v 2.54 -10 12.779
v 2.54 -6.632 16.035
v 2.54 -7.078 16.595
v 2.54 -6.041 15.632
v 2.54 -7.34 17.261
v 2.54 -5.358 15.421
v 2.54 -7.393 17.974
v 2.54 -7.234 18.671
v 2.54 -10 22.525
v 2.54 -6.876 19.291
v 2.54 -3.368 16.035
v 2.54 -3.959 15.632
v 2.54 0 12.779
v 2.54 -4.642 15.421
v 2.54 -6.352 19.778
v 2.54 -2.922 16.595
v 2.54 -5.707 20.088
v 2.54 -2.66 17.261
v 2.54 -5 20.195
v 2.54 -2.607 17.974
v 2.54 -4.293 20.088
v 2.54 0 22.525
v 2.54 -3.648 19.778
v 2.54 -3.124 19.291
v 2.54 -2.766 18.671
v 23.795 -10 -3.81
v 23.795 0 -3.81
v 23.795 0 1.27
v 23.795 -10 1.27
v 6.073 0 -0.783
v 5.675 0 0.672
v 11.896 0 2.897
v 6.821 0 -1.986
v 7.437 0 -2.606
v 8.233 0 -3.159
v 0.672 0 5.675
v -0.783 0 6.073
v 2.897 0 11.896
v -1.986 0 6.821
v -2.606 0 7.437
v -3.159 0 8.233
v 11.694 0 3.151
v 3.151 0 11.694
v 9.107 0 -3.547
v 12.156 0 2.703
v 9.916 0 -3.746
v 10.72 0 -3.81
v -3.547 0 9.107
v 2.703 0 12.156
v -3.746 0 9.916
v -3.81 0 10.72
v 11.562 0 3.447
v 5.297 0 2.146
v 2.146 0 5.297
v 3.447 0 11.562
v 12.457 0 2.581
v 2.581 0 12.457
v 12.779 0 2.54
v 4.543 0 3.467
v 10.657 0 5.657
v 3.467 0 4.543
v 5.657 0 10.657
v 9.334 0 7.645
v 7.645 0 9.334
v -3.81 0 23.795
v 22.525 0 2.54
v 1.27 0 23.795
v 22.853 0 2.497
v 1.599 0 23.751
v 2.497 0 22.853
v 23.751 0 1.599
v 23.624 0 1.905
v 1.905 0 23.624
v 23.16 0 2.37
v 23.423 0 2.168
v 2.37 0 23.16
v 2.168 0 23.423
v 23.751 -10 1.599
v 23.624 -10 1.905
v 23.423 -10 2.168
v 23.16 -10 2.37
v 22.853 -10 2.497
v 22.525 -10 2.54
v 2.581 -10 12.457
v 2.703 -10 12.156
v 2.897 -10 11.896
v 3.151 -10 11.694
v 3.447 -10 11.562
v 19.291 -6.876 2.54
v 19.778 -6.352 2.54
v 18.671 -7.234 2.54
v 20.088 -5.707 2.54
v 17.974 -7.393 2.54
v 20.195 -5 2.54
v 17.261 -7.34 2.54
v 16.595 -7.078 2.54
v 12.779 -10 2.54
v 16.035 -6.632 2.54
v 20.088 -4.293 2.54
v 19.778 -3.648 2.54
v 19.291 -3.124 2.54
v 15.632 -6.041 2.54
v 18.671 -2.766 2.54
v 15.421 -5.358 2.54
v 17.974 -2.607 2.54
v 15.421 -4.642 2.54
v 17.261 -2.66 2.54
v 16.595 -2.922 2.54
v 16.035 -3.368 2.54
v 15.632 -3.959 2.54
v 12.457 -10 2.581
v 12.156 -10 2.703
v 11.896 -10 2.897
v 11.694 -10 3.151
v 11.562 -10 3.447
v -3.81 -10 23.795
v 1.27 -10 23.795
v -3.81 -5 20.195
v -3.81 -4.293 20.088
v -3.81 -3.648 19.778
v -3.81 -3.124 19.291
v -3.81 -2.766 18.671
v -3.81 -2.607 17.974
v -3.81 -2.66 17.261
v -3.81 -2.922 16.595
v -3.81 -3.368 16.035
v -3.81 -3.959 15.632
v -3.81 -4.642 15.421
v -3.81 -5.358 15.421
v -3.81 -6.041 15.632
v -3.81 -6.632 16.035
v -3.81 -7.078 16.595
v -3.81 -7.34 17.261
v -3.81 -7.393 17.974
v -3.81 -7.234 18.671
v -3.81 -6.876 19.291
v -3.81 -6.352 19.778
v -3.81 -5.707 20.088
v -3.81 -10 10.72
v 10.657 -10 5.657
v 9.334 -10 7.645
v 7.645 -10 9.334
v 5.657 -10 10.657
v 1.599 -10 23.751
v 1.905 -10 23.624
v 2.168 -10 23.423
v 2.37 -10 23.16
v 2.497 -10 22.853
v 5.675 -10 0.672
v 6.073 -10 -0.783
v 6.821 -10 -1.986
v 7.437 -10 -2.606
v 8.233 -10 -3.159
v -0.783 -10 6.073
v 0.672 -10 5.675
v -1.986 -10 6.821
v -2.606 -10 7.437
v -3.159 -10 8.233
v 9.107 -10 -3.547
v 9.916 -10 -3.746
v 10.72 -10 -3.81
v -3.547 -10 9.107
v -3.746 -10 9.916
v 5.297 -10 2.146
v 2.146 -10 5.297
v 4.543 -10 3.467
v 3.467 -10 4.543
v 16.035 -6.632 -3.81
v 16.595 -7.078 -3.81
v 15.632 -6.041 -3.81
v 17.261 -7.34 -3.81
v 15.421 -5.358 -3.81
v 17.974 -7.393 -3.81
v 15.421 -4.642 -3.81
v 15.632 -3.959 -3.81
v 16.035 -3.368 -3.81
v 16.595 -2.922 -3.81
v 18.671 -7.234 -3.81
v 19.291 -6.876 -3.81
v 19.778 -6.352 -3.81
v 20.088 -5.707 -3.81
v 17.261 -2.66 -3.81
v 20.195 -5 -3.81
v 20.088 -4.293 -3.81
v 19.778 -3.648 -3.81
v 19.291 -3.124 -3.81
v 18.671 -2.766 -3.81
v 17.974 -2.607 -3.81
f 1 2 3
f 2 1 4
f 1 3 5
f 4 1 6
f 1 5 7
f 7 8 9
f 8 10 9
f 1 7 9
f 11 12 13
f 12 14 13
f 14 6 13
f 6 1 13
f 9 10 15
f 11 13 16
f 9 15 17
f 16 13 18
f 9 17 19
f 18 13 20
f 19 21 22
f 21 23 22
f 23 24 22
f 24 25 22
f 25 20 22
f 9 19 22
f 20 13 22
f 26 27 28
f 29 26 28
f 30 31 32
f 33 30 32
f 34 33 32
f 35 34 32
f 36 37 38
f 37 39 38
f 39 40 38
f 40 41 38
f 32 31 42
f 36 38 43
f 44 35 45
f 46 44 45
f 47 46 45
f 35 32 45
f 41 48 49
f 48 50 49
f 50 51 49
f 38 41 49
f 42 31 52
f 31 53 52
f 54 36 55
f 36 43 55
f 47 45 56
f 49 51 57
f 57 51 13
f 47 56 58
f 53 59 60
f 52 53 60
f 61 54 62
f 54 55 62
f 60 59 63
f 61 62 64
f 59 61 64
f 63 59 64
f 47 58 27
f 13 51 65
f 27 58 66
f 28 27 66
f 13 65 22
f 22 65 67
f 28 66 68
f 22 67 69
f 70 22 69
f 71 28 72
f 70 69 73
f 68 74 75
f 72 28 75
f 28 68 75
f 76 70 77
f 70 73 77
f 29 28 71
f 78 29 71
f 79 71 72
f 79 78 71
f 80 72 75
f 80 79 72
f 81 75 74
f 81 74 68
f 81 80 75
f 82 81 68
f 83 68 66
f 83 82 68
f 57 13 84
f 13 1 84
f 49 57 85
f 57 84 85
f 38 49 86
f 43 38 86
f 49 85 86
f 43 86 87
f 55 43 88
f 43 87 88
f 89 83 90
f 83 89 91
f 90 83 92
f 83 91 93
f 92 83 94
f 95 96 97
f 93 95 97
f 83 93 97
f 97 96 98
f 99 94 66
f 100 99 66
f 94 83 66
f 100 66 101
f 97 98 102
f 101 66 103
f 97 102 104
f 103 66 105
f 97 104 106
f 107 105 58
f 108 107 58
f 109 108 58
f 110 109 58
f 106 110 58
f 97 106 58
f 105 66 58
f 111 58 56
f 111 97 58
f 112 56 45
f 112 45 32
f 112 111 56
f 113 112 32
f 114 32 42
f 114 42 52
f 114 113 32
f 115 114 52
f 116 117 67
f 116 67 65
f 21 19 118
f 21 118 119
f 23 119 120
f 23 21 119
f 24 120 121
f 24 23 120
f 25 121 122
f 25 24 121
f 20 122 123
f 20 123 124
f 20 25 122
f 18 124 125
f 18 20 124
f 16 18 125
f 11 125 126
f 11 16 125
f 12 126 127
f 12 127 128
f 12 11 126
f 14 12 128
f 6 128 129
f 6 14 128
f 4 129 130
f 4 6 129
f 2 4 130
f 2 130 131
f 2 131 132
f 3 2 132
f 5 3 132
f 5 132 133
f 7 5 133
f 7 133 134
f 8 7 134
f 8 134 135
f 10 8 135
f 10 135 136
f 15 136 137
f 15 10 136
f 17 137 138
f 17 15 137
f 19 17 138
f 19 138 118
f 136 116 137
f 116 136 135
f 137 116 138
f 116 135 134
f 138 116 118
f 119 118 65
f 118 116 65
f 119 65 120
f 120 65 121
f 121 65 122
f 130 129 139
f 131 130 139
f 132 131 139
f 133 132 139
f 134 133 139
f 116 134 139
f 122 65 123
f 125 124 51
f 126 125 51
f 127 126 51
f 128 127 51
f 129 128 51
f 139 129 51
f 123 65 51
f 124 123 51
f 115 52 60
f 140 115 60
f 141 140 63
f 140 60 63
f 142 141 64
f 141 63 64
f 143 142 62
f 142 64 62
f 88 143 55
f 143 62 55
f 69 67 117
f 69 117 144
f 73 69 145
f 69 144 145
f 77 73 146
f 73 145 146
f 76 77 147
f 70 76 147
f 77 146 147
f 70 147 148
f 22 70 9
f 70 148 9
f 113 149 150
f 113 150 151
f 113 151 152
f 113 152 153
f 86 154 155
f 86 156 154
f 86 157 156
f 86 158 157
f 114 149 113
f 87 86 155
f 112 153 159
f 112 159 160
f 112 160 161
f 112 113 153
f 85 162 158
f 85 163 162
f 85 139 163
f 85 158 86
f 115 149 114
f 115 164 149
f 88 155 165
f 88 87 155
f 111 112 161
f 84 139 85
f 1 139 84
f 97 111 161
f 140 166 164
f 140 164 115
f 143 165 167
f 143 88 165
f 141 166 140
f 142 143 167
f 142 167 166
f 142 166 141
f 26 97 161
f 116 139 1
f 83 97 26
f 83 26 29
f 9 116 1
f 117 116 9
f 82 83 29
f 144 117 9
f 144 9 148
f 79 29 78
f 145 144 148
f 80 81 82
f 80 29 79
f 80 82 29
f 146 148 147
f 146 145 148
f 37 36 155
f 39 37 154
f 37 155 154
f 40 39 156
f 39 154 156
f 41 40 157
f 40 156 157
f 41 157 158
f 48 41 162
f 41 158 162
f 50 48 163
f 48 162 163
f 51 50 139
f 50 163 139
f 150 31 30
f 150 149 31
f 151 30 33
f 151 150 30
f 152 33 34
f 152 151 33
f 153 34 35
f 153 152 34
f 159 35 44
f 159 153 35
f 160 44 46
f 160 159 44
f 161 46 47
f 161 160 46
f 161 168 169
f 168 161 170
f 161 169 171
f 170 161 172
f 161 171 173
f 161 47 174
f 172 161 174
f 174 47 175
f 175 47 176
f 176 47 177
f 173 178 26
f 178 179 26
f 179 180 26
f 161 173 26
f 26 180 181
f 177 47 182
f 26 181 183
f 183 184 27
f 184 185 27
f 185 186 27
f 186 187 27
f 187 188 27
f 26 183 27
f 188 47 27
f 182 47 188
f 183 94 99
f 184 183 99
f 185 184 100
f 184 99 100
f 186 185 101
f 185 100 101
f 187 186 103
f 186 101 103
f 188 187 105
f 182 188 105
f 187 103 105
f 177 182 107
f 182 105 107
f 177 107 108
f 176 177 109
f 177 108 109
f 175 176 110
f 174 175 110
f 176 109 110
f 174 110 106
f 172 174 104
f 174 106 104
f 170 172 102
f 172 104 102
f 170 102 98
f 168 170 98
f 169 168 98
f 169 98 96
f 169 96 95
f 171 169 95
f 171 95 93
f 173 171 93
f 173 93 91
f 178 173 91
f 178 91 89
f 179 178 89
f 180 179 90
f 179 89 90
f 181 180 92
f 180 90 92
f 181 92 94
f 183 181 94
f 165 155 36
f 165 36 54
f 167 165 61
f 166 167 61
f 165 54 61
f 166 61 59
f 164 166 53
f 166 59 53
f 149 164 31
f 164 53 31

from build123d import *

# Parameters (mm, degrees)
F1_DEPTH = 10
F2_R     = 2.4
F3_DEPTH = 6.35
F7_R     = 5.08
F8_R     = 1.27


# Not quite as in the source:
# - a pattern or mirror of a feature is missing from the dataset's text; its kind, count and spacing are read off the source's solid


with BuildPart() as f1:
    # F0 (on Front) → F1 (new body)
    with BuildSketch(Plane.XZ):
        with BuildLine():
            ThreePointArc((0, 5.715), (4.0411152545, 4.0411152545), (5.715, 0))
            Line((5.715, 0), (5.715, -3.81))
            Line((5.715, -3.81), (23.7946015193, -3.81))
            Line((23.7946015193, -3.81), (23.7946015193, 2.54))
            Line((23.7946015193, 2.54), (11.7946015193, 2.54))
            ThreePointArc((11.7946015193, 2.54), (8.531243315, 8.531243315), (2.54, 11.7946015193))
            Line((2.54, 11.7946015193), (2.54, 23.7946015193))
            Line((2.54, 23.7946015193), (-3.81, 23.7946015193))
            Line((-3.81, 23.7946015193), (-3.81, 5.715))
            Line((-3.81, 5.715), (0, 5.715))
        make_face()
    extrude(amount=F1_DEPTH)

    # F2 (on face) → F3 (cut, through all)
    with BuildSketch(Plane.XY.offset(2.54)):
        with Locations((17.7946015193, -5)):
            Circle(F2_R)
    f3 = extrude(amount=-F3_DEPTH, mode=Mode.SUBTRACT)

    # F3_copies: F3 across plane
    add(f3.mirror(Plane(origin=(0, 0, 0), x_dir=(0.7071067812, 0, 0.7071067812), z_dir=(-0.7071067812, 0, 0.7071067812))), mode=Mode.SUBTRACT)

    # F7
    f7_edges = [f1.edges().sort_by_distance(p)[0] for p in [
        (-3.81, -5, 5.715),
        (5.715, -5, -3.81),
    ]]
    fillet(f7_edges, radius=F7_R)

    # F8
    f8_edges = [f1.edges().sort_by_distance(p)[0] for p in [
        (2.54, -5, 23.794602),
        (2.54, -5, 11.794602),
        (11.794602, -5, 2.54),
        (23.794602, -5, 2.54),
    ]]
    fillet(f8_edges, radius=F8_R)


solid = f1.part
